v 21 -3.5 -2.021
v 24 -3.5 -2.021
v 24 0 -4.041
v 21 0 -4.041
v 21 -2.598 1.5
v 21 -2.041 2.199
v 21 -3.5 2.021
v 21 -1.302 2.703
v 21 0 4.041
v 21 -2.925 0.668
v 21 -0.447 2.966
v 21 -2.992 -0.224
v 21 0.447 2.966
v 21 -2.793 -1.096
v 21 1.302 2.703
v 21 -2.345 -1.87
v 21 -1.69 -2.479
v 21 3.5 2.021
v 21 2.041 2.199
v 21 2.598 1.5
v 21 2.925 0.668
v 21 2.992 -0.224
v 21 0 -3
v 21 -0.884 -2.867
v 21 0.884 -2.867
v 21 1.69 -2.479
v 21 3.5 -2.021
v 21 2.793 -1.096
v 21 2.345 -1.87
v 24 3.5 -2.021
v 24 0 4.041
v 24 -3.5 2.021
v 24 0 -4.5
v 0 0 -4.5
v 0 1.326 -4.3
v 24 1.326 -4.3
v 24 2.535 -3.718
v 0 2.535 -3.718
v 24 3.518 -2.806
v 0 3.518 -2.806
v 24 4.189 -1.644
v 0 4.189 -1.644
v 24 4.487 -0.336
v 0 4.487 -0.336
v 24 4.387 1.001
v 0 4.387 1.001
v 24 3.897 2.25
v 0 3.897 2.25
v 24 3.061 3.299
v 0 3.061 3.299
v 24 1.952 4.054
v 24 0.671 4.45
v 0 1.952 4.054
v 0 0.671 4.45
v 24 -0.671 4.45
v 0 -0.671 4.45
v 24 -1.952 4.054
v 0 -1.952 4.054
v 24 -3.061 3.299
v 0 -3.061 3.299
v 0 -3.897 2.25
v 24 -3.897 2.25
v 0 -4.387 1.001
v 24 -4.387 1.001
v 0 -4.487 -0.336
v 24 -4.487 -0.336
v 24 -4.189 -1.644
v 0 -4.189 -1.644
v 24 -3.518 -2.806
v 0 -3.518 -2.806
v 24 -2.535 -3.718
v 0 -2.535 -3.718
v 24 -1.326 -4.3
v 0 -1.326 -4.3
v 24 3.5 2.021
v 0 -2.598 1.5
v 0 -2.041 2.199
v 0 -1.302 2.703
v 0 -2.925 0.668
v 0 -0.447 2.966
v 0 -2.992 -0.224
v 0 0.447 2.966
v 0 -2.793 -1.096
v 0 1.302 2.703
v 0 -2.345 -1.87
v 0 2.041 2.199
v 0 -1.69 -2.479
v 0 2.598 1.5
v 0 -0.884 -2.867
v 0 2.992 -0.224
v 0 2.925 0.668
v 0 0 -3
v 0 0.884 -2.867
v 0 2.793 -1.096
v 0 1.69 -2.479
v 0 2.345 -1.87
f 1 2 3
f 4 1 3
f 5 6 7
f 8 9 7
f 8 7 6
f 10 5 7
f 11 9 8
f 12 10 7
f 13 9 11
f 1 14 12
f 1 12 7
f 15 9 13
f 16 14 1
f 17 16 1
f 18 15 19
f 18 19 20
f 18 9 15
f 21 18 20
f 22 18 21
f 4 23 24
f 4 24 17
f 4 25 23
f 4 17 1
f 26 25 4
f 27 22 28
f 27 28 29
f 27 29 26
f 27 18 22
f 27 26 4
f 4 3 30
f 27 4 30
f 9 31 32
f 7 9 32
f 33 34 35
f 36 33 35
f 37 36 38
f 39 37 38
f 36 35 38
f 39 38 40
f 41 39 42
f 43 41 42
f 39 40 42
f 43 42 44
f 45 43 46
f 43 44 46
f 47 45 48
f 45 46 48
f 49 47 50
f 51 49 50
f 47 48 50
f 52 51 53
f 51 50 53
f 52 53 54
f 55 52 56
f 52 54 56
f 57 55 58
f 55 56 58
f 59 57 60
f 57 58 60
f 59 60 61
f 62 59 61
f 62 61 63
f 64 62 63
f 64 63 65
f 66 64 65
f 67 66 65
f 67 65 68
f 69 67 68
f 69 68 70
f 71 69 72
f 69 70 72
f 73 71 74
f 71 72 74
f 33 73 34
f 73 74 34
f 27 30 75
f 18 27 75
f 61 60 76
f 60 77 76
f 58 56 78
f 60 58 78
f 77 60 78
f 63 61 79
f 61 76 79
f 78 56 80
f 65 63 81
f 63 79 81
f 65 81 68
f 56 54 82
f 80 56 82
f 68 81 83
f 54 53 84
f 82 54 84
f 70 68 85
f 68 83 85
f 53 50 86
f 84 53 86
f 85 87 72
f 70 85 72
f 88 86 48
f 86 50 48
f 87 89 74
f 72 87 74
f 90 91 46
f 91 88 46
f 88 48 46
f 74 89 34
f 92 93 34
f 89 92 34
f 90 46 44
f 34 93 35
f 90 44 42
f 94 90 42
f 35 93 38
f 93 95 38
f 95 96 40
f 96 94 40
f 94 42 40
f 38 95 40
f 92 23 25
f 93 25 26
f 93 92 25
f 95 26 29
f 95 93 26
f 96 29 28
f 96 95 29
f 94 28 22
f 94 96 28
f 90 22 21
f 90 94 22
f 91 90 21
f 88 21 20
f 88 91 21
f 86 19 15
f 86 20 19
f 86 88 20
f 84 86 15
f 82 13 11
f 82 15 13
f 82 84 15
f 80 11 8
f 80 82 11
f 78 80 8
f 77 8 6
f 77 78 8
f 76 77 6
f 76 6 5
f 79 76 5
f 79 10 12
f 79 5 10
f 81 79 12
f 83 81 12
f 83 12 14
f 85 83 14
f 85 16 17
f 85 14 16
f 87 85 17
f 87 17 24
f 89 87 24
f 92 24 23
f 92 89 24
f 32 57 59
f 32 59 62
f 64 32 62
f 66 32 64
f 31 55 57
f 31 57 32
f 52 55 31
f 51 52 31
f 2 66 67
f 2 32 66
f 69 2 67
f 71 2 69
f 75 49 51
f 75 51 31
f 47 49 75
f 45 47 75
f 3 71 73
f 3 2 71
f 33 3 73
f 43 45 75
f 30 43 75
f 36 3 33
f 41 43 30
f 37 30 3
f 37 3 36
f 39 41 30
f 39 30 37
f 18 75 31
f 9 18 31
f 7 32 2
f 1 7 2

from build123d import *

# Parameters (mm, degrees)
SZKIC1_R                    = 4.5
SZKIC1_R_2                  = 3
DODANIE_WYCI_GNI_CIE1_DEPTH = 24
WYTNIJ_WYCI_GNI_CIE1_DEPTH  = 3


with BuildPart() as part:
    # Szkic1 → Dodanie-wyciągnięcie1 (new body)
    with BuildSketch(Plane(origin=(0, 0, 0), x_dir=(0, 0, -1), z_dir=(1, 0, 0))):
        Circle(SZKIC1_R)
        Circle(SZKIC1_R_2, mode=Mode.SUBTRACT)
    extrude(amount=DODANIE_WYCI_GNI_CIE1_DEPTH)

    # Szkic2 → Wytnij-wyciągnięcie1 (cut)
    with BuildSketch(Plane(origin=(24, 0, 0), x_dir=(0, 0, -1), z_dir=(1, 0, 0))):
        Polygon((4.041451884, 0), (2.020725942, 3.5), (-2.020725942, 3.5), (-4.041451884, 0), (-2.020725942, -3.5), (2.020725942, -3.5), align=None)
    extrude(amount=-WYTNIJ_WYCI_GNI_CIE1_DEPTH, mode=Mode.SUBTRACT)


solid = part.part
